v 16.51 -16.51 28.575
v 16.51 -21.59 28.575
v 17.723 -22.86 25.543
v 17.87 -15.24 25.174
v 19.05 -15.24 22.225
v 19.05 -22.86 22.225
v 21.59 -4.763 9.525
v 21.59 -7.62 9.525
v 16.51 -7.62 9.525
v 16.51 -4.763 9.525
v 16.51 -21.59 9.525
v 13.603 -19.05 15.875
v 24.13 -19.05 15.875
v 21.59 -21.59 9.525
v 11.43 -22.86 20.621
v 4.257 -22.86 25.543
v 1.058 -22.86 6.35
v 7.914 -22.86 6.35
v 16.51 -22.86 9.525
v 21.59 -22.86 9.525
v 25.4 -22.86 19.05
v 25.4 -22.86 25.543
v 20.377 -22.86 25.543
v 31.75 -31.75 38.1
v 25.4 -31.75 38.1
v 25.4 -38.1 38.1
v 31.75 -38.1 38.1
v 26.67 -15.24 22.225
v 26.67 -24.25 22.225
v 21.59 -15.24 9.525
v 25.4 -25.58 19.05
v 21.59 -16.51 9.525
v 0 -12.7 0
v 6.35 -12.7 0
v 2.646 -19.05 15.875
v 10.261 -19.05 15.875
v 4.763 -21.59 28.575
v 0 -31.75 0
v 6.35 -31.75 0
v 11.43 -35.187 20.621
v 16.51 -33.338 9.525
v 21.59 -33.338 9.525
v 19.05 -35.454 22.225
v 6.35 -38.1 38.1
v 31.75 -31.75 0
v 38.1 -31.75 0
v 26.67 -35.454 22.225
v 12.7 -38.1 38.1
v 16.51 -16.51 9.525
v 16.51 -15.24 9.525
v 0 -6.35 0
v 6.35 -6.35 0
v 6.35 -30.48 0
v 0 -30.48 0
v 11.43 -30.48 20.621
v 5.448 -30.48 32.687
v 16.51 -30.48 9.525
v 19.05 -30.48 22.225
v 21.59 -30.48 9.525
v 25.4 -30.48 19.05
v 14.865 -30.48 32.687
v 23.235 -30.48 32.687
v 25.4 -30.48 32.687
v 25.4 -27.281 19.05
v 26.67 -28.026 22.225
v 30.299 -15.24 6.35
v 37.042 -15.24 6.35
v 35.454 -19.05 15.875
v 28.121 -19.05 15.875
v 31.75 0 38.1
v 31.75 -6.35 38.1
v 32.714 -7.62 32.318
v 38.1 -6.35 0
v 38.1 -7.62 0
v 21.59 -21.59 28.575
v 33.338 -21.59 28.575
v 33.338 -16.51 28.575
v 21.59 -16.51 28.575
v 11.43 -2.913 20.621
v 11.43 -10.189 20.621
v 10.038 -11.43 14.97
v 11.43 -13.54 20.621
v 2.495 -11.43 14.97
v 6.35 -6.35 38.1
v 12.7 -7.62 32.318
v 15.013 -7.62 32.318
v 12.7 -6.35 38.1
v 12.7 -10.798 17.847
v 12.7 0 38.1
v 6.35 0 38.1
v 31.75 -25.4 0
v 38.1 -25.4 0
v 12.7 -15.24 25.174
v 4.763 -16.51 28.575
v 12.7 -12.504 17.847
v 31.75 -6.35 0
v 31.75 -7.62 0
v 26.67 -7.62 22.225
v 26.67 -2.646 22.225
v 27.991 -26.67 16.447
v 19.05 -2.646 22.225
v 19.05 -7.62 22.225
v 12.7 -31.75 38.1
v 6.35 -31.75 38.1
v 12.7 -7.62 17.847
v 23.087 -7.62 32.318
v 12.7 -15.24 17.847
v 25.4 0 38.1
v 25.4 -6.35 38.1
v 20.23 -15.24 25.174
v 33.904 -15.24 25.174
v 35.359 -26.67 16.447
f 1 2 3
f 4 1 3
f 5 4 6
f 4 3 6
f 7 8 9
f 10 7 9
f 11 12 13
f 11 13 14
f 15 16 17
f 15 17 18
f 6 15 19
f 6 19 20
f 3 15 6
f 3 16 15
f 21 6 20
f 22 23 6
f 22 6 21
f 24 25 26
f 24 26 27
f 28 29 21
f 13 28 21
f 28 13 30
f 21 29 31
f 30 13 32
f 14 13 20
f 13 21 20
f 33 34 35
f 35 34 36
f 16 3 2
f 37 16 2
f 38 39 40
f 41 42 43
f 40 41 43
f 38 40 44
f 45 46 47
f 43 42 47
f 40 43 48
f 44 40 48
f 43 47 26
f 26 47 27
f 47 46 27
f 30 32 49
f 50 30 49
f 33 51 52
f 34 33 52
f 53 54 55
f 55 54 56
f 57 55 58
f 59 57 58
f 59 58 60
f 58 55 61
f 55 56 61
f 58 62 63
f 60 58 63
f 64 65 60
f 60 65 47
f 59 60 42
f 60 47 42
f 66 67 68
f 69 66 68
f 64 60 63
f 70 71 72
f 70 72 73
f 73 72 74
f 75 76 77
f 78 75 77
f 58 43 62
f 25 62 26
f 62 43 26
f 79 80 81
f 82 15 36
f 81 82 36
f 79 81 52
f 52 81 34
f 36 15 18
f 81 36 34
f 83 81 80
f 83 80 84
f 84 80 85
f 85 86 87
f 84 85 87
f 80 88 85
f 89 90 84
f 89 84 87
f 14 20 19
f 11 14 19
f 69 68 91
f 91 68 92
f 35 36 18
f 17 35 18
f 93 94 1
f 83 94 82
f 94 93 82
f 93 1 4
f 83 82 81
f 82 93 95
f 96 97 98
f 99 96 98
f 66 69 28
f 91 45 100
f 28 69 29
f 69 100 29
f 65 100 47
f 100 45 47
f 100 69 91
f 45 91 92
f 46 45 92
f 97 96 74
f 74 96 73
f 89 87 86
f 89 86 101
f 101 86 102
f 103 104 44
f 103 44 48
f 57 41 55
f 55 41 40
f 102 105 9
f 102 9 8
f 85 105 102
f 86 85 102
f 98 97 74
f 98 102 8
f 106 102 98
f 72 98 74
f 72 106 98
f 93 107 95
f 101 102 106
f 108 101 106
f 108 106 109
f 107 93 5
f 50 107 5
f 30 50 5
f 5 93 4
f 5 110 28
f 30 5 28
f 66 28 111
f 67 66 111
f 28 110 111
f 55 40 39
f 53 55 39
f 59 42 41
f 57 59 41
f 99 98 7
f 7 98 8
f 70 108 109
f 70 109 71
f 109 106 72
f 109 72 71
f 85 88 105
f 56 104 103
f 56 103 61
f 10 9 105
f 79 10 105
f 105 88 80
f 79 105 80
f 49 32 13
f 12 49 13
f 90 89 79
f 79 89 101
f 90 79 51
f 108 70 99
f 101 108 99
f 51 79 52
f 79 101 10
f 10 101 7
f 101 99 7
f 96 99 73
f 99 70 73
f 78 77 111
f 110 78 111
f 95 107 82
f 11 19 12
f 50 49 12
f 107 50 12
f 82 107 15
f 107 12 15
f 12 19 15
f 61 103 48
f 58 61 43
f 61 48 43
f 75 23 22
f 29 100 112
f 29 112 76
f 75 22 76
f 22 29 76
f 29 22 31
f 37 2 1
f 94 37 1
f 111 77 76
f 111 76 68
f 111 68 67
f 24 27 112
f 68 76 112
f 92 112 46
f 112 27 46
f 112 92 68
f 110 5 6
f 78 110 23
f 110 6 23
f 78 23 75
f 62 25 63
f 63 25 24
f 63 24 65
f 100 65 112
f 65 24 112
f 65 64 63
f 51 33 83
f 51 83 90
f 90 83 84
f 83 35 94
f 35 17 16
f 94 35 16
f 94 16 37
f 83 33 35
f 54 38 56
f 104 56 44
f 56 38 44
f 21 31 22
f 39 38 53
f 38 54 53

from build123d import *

# Parameters (mm, degrees)
F0_W      = 38.1
F0_H      = 38.1
F1_DEPTH  = 38.1
F6_DEPTH  = 38.1
F8_DEPTH  = 38.1
F9_W      = 25.4
F9_H      = 7.62
F10_DEPTH = 38.1


with BuildPart() as f1:
    # F0 (on Front) → F1 (new body)
    with BuildSketch(Plane.XZ):
        with Locations((19.05, 19.05)):
            Rectangle(F0_W, F0_H)
    extrude(amount=F1_DEPTH)

    # F5 (on offset) → F6 (cut)
    with BuildSketch(Plane.YZ.offset(38.1)):
        Polygon((-31.75, 0), (-38.1, 38.1), (-38.1, 0), align=None)
        Polygon((-11.43, 14.970142), (-6.35, 38.1), (-31.75, 38.1), (-26.67, 16.447108), (-21.59, 28.575), (-16.51, 28.575), align=None)
        Polygon((-25.4, 0), (-12.7, 0), (-19.05, 15.875), align=None)
        Polygon((-6.35, 0), (0, 0), (0, 38.1), align=None)
    extrude(amount=-F6_DEPTH, mode=Mode.SUBTRACT)

    # F7 (on offset) → F8 (cut)
    with BuildSketch(Plane.XZ.offset(38.1)):
        Polygon((0, 38.1), (0, 0), (6.35, 38.1), align=None)
        Polygon((25.4, 38.1), (12.7, 38.1), (19.05, 22.225), align=None)
        Polygon((11.43, 20.620601), (6.35, 0), (31.75, 0), (26.67, 22.225), (21.59, 9.525), (16.51, 9.525), align=None)
        Polygon((31.75, 38.1), (38.1, 0), (38.1, 38.1), align=None)
    extrude(amount=-F8_DEPTH, mode=Mode.SUBTRACT)

    # F9 (on offset) → F10 (cut)
    with BuildSketch(Plane.XY.offset(38.1)):
        with Locations((25.4, -11.43)):
            Rectangle(F9_W, F9_H)
        with Locations((12.7, -26.67)):
            Rectangle(F9_W, F9_H)
    extrude(amount=-F10_DEPTH, mode=Mode.SUBTRACT)


solid = f1.part
